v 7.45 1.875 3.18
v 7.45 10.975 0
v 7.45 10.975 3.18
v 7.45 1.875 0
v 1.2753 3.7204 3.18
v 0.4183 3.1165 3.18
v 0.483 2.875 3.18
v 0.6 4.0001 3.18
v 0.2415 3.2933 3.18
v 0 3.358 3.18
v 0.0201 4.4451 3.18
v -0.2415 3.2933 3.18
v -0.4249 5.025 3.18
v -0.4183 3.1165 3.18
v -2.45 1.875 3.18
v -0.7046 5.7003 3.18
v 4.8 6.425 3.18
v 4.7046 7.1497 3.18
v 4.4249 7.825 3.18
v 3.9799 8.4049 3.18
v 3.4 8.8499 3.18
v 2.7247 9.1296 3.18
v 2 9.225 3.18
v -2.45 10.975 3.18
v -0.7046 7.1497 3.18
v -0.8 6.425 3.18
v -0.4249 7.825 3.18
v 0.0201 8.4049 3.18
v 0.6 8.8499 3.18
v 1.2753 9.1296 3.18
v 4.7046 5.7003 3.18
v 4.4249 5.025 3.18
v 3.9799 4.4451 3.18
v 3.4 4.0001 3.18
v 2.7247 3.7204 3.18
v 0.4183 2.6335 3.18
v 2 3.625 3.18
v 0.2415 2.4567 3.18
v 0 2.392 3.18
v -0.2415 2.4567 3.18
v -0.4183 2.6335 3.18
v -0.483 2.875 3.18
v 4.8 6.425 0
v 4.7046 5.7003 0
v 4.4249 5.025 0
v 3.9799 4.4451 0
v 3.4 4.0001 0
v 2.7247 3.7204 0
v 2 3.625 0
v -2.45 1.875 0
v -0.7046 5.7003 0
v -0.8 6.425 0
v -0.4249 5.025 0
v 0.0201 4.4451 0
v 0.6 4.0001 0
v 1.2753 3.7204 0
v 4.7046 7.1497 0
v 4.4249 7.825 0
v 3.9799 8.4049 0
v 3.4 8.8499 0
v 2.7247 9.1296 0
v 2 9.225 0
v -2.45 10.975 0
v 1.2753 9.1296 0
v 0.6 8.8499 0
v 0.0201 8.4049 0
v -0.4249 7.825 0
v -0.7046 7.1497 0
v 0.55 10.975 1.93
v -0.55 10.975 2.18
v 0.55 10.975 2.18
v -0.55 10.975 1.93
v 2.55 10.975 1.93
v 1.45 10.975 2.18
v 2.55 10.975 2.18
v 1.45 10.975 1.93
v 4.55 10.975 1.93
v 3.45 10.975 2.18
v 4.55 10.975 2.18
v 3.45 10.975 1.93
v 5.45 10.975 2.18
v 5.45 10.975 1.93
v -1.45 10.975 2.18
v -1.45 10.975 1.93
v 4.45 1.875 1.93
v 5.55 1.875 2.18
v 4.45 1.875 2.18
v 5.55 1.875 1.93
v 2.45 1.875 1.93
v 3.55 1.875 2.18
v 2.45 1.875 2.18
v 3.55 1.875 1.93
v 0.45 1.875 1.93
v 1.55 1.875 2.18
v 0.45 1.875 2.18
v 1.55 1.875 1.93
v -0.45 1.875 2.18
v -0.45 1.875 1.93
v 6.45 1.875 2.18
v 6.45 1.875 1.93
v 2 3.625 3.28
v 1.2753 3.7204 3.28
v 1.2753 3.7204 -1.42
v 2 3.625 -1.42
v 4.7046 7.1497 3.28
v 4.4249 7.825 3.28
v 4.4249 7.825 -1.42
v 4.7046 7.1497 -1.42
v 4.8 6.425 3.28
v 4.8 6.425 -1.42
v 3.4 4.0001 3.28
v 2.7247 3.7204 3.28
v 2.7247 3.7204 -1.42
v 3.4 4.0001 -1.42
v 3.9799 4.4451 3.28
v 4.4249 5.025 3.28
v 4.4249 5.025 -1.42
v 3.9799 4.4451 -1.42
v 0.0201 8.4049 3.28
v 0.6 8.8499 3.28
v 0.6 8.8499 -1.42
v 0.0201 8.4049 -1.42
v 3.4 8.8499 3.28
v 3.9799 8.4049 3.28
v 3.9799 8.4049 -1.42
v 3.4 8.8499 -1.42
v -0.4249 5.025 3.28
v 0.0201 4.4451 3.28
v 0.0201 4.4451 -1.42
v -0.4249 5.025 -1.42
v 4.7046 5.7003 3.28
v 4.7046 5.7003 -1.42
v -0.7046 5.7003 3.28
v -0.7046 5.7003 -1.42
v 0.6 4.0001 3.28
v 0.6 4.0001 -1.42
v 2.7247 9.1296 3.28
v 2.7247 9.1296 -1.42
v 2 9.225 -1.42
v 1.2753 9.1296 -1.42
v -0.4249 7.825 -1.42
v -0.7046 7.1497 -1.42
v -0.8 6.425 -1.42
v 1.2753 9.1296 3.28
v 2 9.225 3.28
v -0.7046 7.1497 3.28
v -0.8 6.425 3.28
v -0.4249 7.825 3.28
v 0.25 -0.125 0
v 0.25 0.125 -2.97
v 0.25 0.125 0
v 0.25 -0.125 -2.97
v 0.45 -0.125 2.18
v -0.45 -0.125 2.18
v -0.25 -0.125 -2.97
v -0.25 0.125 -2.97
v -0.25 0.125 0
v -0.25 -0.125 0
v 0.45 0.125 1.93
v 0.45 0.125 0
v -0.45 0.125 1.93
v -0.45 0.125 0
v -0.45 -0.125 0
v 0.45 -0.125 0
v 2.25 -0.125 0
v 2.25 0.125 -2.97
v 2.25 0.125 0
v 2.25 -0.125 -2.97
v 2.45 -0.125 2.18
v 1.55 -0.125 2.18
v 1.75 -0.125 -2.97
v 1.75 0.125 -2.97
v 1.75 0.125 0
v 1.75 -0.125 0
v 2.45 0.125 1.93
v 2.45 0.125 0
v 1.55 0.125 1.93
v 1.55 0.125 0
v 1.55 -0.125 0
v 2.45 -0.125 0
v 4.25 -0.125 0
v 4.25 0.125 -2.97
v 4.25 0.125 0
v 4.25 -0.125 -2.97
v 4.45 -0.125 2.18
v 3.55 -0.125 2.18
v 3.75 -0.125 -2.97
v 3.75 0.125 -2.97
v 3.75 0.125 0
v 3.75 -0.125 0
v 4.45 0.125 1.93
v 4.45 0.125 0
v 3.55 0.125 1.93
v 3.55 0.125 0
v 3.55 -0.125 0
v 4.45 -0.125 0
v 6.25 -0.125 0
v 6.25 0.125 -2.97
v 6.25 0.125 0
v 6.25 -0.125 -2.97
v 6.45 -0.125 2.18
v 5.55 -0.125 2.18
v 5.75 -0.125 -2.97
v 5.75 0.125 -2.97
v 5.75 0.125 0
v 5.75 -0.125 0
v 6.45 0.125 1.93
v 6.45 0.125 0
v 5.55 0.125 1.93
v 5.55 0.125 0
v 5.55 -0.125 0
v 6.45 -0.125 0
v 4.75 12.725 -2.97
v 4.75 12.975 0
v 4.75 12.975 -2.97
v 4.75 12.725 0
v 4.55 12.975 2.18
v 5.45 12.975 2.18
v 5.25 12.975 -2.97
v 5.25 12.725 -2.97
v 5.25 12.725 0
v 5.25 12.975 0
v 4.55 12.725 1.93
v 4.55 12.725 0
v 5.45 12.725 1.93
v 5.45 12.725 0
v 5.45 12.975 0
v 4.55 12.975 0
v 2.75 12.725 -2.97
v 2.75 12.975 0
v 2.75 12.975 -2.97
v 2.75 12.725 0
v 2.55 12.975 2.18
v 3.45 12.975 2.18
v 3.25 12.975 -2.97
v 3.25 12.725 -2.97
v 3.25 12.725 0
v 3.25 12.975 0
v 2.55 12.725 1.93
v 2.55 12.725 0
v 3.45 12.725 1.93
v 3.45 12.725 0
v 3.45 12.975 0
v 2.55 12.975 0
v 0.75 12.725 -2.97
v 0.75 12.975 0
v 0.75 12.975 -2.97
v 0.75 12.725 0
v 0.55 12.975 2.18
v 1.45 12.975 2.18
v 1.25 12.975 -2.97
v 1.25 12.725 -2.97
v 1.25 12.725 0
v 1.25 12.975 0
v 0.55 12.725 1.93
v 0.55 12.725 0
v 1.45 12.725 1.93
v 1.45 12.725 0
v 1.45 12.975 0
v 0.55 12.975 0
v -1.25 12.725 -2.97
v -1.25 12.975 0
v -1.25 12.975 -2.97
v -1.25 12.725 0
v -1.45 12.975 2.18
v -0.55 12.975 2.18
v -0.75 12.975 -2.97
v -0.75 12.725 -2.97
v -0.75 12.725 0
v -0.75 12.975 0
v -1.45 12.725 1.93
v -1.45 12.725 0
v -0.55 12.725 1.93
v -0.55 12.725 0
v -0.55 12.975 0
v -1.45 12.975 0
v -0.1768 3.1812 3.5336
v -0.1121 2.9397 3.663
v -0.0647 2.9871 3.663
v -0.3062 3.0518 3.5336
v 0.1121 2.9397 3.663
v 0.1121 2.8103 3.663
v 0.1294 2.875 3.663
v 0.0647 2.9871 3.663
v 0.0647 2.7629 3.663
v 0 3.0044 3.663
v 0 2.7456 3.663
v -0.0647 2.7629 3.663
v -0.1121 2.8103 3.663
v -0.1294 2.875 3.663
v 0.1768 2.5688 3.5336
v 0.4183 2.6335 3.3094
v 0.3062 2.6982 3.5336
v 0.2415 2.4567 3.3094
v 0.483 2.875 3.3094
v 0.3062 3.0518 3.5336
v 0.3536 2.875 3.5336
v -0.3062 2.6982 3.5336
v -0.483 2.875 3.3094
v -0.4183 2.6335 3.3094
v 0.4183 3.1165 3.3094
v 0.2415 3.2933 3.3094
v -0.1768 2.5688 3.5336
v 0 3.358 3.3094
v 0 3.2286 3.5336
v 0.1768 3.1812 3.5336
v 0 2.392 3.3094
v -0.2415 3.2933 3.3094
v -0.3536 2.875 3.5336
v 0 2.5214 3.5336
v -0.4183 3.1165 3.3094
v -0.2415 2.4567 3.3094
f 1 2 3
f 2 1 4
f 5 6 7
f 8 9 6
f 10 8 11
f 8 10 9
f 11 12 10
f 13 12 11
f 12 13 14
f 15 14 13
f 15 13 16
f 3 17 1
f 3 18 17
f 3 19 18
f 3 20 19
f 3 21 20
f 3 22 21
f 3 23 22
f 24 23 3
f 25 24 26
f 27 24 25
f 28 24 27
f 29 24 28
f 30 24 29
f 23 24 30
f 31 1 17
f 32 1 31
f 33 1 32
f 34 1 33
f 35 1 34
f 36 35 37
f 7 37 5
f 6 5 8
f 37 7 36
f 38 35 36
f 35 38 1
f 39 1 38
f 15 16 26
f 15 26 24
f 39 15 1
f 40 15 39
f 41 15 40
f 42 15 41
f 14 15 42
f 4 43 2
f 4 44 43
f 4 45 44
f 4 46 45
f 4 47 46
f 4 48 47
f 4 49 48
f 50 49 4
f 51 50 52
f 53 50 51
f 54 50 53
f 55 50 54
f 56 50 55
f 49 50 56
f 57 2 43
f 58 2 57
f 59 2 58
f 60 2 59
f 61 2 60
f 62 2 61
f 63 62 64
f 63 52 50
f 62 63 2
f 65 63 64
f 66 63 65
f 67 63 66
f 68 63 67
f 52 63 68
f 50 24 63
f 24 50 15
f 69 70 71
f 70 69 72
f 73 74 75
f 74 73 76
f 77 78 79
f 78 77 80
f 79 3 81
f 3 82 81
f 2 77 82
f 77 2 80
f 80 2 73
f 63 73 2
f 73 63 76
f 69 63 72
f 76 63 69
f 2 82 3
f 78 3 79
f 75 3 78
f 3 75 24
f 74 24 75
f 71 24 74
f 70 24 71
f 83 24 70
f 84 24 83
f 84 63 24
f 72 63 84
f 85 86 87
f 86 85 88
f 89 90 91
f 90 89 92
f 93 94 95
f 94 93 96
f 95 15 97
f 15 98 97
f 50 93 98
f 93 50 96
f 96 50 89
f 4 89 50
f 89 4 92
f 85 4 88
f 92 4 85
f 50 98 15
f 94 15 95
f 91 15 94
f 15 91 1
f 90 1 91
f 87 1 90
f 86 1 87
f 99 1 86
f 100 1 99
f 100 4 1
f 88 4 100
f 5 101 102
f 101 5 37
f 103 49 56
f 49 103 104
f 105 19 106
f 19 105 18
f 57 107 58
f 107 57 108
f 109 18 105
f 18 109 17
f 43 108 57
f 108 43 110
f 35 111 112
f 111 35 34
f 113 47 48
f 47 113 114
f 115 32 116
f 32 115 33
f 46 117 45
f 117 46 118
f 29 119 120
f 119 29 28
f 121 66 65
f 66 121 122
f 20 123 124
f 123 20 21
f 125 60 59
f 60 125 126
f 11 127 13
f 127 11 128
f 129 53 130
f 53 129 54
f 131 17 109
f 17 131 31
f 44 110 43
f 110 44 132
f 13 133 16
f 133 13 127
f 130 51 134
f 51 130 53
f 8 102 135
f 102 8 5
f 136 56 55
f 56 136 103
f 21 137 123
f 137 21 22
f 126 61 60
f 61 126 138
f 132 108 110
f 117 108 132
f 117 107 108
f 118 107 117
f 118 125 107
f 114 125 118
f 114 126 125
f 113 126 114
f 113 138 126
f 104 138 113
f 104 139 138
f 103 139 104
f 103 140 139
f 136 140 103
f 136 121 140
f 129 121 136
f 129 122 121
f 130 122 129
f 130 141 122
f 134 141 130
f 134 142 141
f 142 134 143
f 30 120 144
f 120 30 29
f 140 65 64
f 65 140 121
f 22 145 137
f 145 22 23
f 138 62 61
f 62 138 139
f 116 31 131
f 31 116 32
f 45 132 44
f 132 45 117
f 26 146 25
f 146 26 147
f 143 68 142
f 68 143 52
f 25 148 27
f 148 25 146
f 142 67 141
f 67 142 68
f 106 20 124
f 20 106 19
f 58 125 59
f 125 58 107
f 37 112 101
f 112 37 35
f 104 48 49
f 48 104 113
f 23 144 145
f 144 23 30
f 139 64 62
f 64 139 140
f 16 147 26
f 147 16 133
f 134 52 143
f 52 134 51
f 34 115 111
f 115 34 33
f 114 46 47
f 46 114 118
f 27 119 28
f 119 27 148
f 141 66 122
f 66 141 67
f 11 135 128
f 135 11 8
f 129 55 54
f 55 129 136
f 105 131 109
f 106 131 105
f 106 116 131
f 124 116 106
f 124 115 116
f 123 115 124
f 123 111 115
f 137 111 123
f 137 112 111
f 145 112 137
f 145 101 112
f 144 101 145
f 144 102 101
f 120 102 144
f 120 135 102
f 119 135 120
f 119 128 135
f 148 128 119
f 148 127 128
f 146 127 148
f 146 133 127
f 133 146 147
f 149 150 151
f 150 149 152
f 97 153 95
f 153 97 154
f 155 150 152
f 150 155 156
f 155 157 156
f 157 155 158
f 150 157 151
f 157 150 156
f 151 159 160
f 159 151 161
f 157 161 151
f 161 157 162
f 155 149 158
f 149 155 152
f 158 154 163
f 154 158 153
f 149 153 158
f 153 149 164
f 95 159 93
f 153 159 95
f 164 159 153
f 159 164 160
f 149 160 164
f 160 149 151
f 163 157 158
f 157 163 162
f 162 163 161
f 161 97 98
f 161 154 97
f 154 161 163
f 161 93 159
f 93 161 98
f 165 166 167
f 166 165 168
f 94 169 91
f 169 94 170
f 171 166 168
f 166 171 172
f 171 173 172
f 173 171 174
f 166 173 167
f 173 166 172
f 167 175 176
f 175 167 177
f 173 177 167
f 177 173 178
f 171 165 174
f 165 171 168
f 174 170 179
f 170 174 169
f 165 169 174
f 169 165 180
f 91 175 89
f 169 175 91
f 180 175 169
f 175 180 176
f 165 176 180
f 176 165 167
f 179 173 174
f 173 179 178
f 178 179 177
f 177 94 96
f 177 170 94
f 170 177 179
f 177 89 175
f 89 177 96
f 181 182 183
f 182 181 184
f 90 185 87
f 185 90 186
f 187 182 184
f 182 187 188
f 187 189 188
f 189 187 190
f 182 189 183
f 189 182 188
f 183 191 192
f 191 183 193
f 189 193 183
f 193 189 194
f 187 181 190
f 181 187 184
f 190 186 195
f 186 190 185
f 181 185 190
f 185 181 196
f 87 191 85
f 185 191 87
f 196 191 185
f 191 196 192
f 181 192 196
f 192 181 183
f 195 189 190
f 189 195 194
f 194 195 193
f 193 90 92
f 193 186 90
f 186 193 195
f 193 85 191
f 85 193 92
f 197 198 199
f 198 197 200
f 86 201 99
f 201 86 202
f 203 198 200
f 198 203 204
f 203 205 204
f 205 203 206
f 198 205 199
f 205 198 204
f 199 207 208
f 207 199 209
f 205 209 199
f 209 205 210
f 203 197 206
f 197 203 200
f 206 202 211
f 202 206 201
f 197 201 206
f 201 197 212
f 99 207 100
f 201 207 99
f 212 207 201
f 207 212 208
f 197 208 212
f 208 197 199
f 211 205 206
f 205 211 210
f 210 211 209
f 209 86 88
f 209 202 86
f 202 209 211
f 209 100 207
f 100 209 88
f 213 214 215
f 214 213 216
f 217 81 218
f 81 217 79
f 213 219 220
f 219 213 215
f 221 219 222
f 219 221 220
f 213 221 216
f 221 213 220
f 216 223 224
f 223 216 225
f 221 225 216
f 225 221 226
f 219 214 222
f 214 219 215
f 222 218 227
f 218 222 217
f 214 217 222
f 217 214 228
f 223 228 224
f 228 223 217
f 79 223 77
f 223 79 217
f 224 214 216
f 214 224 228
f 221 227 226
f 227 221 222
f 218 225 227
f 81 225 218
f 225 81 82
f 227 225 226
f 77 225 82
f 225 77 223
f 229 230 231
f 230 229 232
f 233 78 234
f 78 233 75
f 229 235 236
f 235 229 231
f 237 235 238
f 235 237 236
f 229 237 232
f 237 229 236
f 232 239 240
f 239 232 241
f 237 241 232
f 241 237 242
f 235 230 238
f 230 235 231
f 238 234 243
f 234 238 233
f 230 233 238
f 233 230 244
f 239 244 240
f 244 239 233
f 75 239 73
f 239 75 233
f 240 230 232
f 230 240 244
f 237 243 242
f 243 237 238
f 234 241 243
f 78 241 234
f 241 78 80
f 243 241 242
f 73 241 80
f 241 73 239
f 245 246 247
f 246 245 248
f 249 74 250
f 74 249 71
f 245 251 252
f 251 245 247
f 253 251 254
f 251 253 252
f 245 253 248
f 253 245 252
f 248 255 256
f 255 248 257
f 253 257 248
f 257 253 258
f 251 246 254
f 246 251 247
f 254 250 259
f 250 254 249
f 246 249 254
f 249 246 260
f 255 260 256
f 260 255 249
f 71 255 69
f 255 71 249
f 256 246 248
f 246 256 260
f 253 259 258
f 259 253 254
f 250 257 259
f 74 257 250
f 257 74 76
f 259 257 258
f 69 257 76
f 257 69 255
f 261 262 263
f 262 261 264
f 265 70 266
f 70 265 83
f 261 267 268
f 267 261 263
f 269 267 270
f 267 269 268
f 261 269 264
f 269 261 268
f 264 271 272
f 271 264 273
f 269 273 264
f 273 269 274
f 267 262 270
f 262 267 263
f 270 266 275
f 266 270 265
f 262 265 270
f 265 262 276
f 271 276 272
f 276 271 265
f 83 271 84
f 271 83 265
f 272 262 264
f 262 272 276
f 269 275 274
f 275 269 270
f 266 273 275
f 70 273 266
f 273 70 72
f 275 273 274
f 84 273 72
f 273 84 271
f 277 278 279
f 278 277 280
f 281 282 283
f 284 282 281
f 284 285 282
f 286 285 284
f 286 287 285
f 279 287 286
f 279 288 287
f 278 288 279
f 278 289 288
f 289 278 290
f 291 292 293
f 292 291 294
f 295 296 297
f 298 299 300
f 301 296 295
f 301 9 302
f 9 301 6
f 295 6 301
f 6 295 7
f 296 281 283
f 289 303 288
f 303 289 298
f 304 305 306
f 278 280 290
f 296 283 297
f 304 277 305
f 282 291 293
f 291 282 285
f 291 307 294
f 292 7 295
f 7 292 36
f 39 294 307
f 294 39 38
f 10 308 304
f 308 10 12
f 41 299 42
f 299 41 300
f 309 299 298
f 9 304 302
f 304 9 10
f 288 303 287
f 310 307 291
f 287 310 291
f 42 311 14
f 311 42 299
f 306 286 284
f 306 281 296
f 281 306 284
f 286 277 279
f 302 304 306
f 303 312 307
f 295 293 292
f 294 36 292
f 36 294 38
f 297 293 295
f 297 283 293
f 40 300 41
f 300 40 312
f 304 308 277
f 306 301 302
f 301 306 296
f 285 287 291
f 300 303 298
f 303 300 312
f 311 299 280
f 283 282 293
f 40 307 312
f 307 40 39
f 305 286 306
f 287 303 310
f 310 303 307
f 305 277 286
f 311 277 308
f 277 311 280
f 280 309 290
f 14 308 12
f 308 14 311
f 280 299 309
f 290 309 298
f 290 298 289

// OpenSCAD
// Model of Avago Technologies ADNS-2610

// Pin 1 is [0,0,0] unless using adns2610_oc0

// adns2610_render_part=0;
 adns2610_render_part=1; // adns2610()
// adns2610_render_part=2; // adns2610_oc0()
// adns2610_render_part=3; // parametric adns2610_oc0 example

module adns2610_pin(
	pinDTh=0.0
	, pinDH=0.0
        , pinH=5.15
        , pinTh=0.25
        , pinWB=0.50
        , pinWT=0.90
        , pin2TH=1.00
        , pkgB2TH=3.18
	, pin2pkg=(12.85-9.10)/2
	, pinColor=[192/255,192/255,0]
        ) {
  $fs=0.1;
  $fa=15;
  color(pinColor) {
    translate([-pinWB/2,-(pinTh+pinDTh)/2,pkgB2TH-pinH-pinDH-pin2TH])
        cube(size=[pinWB, (pinTh+pinDTh), pinH+pinDH], center=false);
    translate([-pinWT/2, -(pinTh+pinDTh)/2, 0])
        cube(size=[pinWT, (pinTh+pinDTh), pkgB2TH-pin2TH], center=false);
    translate([-pinWT/2, -(pinTh+pinDTh)/2, pkgB2TH-pin2TH]) rotate([-90,0,0])
        cube(size=[pinWT, (pinTh+pinDTh), pin2pkg+pinTh], center=false);
  }
}


module adns2610(
	pinDTh=0.0
	, pinDH=0.0
	, opticalDD=0.0
	, opticalDZ=0.0
	, pinH=5.15
	, pinTh=0.25
	, pinWB=0.50
	, pinWT=0.90
	, pin2TH=1.00
	, pkgB2TH=3.18
	, pin2pin=2.00
	, pin2pkg=(12.85-9.10)/2
	, row2row=12.85
	, pkgW=9.10
	, pkgL=9.90
	, opticalXC=2.00
	, opticalYC=4.55+(12.85-9.10)/2
	, opticalD=5.60
	, opticalZ=1.42
	, bodyColor=[64/255,64/255,64/255]
	) {
  color(bodyColor) {
    // package
    translate([opticalXC-4.45,opticalYC-4.55,0])
      cube(size=[pkgL, pkgW, pkgB2TH],center=false);
    // optical path
    translate([opticalXC,opticalYC,-opticalZ-opticalDZ])
      cylinder($fa=15, $fs=0.1, r=(opticalD+opticalDD)/2,h=opticalZ+opticalDZ,center=false);
    // optical path top marker
    translate([opticalXC,opticalYC,-0.1]) cylinder($fa=15, $fs=0.1, r=opticalD/2,h=pkgB2TH+0.2,center=false);
  }
  // pin1
  adns2610_pin( pinDTh=pinDTh, pinDH=pinDH, pinH=pinH , pinTh=pinTh , pinWB=pinWB , pinWT=pinWT , pin2TH=pin2TH , pkgB2TH=pkgB2TH, pin2pkg=pin2pkg);
  // pin1 indicator
  color([1,1,1]-bodyColor)
    translate([0,pin2pkg+1.0,pkgB2TH]) sphere($fa=30, $fs=0.1, r=0.5,center=true);
  // pin2
  translate([pin2pin,0,0])
    adns2610_pin( pinDTh=pinDTh, pinDH=pinDH, pinH=pinH, pinTh=pinTh , pinWB=pinWB , pinWT=pinWT , pin2TH=pin2TH , pkgB2TH=pkgB2TH, pin2pkg=pin2pkg);
  // pin3
  translate([2*pin2pin,0,0])
    adns2610_pin( pinDTh=pinDTh, pinDH=pinDH, pinH=pinH, pinTh=pinTh , pinWB=pinWB , pinWT=pinWT , pin2TH=pin2TH , pkgB2TH=pkgB2TH, pin2pkg=pin2pkg);
  // pin4
  translate([3*pin2pin,0,0])
    adns2610_pin( pinDTh=pinDTh, pinDH=pinDH, pinH=pinH, pinTh=pinTh , pinWB=pinWB , pinWT=pinWT , pin2TH=pin2TH , pkgB2TH=pkgB2TH, pin2pkg=pin2pkg);
  // pin5
  translate([3*pin2pin-pin2pin/2,row2row,0]) rotate([0,0,180])
    adns2610_pin( pinDTh=pinDTh, pinDH=pinDH, pinH=pinH, pinTh=pinTh , pinWB=pinWB , pinWT=pinWT , pin2TH=pin2TH , pkgB2TH=pkgB2TH, pin2pkg=pin2pkg);
  // pin6
  translate([2*pin2pin-pin2pin/2,row2row,0]) rotate([0,0,180])
    adns2610_pin( pinDTh=pinDTh, pinDH=pinDH, pinH=pinH, pinTh=pinTh , pinWB=pinWB , pinWT=pinWT , pin2TH=pin2TH , pkgB2TH=pkgB2TH, pin2pkg=pin2pkg);
  // pin7
  translate([1*pin2pin-pin2pin/2,row2row,0]) rotate([0,0,180])
    adns2610_pin( pinDTh=pinDTh, pinDH=pinDH, pinH=pinH, pinTh=pinTh , pinWB=pinWB , pinWT=pinWT , pin2TH=pin2TH , pkgB2TH=pkgB2TH, pin2pkg=pin2pkg);
  // pin8
  translate([-pin2pin/2,row2row,0]) rotate([0,0,180])
    adns2610_pin( pinDTh=pinDTh, pinDH=pinDH, pinH=pinH, pinTh=pinTh , pinWB=pinWB , pinWT=pinWT , pin2TH=pin2TH , pkgB2TH=pkgB2TH, pin2pkg=pin2pkg);
}

module adns2610_oc0(
	pinDTh=0.0
	, pinDH=0.0
	, opticalDD=0.0
	, opticalDZ=0.0
	, pinH=5.15
	, pinTh=0.25
	, pinWB=0.50
	, pinWT=0.90
	, pin2TH=1.00
	, pkgB2TH=3.18
	, pin2pin=2.00
	, pin2pkg=(12.85-9.10)/2
	, row2row=12.85
	, pkgW=9.10
	, pkgL=9.90
	, opticalXC=2.00
	, opticalYC=4.55+(12.85-9.10)/2
	, opticalD=5.60
	, opticalZ=1.42
	) {
  translate([-opticalXC,-opticalYC,0])
    adns2610(
	pinDTh=pinDTh
	, pinDH=pinDH
	, opticalDD=opticalDD
	, opticalDZ=opticalDZ
	, pinH=pinH
	, pinTh=pinTh
	, pinWB=pinWB
	, pinWT=pinWT
	, pin2TH=pin2TH
	, pkgB2TH=pkgB2TH
	, pin2pin=pin2pin
	, pin2pkg=pin2pkg
	, row2row=row2row
	, pkgW=pkgW
	, pkgL=pkgL
	, opticalXC=opticalXC
	, opticalYC=opticalYC
	, opticalD=opticalD
	, opticalZ=opticalZ
    );
}

if( adns2610_render_part==1 ) {
  echo("Rendering adns2610...");
  adns2610();
}

if( adns2610_render_part==2 ) {
  echo("Rendering adns2610_oc0...");
  adns2610_oc0();
}

if( adns2610_render_part==3 ) {
  echo("Rendering parametric adns2610_oc0 example...");
  adns2610_oc0(
	pinDTh=0.5
	, pinDH=5.0
	, opticalDD=0.2
	, opticalDZ=5.0
  );
}
